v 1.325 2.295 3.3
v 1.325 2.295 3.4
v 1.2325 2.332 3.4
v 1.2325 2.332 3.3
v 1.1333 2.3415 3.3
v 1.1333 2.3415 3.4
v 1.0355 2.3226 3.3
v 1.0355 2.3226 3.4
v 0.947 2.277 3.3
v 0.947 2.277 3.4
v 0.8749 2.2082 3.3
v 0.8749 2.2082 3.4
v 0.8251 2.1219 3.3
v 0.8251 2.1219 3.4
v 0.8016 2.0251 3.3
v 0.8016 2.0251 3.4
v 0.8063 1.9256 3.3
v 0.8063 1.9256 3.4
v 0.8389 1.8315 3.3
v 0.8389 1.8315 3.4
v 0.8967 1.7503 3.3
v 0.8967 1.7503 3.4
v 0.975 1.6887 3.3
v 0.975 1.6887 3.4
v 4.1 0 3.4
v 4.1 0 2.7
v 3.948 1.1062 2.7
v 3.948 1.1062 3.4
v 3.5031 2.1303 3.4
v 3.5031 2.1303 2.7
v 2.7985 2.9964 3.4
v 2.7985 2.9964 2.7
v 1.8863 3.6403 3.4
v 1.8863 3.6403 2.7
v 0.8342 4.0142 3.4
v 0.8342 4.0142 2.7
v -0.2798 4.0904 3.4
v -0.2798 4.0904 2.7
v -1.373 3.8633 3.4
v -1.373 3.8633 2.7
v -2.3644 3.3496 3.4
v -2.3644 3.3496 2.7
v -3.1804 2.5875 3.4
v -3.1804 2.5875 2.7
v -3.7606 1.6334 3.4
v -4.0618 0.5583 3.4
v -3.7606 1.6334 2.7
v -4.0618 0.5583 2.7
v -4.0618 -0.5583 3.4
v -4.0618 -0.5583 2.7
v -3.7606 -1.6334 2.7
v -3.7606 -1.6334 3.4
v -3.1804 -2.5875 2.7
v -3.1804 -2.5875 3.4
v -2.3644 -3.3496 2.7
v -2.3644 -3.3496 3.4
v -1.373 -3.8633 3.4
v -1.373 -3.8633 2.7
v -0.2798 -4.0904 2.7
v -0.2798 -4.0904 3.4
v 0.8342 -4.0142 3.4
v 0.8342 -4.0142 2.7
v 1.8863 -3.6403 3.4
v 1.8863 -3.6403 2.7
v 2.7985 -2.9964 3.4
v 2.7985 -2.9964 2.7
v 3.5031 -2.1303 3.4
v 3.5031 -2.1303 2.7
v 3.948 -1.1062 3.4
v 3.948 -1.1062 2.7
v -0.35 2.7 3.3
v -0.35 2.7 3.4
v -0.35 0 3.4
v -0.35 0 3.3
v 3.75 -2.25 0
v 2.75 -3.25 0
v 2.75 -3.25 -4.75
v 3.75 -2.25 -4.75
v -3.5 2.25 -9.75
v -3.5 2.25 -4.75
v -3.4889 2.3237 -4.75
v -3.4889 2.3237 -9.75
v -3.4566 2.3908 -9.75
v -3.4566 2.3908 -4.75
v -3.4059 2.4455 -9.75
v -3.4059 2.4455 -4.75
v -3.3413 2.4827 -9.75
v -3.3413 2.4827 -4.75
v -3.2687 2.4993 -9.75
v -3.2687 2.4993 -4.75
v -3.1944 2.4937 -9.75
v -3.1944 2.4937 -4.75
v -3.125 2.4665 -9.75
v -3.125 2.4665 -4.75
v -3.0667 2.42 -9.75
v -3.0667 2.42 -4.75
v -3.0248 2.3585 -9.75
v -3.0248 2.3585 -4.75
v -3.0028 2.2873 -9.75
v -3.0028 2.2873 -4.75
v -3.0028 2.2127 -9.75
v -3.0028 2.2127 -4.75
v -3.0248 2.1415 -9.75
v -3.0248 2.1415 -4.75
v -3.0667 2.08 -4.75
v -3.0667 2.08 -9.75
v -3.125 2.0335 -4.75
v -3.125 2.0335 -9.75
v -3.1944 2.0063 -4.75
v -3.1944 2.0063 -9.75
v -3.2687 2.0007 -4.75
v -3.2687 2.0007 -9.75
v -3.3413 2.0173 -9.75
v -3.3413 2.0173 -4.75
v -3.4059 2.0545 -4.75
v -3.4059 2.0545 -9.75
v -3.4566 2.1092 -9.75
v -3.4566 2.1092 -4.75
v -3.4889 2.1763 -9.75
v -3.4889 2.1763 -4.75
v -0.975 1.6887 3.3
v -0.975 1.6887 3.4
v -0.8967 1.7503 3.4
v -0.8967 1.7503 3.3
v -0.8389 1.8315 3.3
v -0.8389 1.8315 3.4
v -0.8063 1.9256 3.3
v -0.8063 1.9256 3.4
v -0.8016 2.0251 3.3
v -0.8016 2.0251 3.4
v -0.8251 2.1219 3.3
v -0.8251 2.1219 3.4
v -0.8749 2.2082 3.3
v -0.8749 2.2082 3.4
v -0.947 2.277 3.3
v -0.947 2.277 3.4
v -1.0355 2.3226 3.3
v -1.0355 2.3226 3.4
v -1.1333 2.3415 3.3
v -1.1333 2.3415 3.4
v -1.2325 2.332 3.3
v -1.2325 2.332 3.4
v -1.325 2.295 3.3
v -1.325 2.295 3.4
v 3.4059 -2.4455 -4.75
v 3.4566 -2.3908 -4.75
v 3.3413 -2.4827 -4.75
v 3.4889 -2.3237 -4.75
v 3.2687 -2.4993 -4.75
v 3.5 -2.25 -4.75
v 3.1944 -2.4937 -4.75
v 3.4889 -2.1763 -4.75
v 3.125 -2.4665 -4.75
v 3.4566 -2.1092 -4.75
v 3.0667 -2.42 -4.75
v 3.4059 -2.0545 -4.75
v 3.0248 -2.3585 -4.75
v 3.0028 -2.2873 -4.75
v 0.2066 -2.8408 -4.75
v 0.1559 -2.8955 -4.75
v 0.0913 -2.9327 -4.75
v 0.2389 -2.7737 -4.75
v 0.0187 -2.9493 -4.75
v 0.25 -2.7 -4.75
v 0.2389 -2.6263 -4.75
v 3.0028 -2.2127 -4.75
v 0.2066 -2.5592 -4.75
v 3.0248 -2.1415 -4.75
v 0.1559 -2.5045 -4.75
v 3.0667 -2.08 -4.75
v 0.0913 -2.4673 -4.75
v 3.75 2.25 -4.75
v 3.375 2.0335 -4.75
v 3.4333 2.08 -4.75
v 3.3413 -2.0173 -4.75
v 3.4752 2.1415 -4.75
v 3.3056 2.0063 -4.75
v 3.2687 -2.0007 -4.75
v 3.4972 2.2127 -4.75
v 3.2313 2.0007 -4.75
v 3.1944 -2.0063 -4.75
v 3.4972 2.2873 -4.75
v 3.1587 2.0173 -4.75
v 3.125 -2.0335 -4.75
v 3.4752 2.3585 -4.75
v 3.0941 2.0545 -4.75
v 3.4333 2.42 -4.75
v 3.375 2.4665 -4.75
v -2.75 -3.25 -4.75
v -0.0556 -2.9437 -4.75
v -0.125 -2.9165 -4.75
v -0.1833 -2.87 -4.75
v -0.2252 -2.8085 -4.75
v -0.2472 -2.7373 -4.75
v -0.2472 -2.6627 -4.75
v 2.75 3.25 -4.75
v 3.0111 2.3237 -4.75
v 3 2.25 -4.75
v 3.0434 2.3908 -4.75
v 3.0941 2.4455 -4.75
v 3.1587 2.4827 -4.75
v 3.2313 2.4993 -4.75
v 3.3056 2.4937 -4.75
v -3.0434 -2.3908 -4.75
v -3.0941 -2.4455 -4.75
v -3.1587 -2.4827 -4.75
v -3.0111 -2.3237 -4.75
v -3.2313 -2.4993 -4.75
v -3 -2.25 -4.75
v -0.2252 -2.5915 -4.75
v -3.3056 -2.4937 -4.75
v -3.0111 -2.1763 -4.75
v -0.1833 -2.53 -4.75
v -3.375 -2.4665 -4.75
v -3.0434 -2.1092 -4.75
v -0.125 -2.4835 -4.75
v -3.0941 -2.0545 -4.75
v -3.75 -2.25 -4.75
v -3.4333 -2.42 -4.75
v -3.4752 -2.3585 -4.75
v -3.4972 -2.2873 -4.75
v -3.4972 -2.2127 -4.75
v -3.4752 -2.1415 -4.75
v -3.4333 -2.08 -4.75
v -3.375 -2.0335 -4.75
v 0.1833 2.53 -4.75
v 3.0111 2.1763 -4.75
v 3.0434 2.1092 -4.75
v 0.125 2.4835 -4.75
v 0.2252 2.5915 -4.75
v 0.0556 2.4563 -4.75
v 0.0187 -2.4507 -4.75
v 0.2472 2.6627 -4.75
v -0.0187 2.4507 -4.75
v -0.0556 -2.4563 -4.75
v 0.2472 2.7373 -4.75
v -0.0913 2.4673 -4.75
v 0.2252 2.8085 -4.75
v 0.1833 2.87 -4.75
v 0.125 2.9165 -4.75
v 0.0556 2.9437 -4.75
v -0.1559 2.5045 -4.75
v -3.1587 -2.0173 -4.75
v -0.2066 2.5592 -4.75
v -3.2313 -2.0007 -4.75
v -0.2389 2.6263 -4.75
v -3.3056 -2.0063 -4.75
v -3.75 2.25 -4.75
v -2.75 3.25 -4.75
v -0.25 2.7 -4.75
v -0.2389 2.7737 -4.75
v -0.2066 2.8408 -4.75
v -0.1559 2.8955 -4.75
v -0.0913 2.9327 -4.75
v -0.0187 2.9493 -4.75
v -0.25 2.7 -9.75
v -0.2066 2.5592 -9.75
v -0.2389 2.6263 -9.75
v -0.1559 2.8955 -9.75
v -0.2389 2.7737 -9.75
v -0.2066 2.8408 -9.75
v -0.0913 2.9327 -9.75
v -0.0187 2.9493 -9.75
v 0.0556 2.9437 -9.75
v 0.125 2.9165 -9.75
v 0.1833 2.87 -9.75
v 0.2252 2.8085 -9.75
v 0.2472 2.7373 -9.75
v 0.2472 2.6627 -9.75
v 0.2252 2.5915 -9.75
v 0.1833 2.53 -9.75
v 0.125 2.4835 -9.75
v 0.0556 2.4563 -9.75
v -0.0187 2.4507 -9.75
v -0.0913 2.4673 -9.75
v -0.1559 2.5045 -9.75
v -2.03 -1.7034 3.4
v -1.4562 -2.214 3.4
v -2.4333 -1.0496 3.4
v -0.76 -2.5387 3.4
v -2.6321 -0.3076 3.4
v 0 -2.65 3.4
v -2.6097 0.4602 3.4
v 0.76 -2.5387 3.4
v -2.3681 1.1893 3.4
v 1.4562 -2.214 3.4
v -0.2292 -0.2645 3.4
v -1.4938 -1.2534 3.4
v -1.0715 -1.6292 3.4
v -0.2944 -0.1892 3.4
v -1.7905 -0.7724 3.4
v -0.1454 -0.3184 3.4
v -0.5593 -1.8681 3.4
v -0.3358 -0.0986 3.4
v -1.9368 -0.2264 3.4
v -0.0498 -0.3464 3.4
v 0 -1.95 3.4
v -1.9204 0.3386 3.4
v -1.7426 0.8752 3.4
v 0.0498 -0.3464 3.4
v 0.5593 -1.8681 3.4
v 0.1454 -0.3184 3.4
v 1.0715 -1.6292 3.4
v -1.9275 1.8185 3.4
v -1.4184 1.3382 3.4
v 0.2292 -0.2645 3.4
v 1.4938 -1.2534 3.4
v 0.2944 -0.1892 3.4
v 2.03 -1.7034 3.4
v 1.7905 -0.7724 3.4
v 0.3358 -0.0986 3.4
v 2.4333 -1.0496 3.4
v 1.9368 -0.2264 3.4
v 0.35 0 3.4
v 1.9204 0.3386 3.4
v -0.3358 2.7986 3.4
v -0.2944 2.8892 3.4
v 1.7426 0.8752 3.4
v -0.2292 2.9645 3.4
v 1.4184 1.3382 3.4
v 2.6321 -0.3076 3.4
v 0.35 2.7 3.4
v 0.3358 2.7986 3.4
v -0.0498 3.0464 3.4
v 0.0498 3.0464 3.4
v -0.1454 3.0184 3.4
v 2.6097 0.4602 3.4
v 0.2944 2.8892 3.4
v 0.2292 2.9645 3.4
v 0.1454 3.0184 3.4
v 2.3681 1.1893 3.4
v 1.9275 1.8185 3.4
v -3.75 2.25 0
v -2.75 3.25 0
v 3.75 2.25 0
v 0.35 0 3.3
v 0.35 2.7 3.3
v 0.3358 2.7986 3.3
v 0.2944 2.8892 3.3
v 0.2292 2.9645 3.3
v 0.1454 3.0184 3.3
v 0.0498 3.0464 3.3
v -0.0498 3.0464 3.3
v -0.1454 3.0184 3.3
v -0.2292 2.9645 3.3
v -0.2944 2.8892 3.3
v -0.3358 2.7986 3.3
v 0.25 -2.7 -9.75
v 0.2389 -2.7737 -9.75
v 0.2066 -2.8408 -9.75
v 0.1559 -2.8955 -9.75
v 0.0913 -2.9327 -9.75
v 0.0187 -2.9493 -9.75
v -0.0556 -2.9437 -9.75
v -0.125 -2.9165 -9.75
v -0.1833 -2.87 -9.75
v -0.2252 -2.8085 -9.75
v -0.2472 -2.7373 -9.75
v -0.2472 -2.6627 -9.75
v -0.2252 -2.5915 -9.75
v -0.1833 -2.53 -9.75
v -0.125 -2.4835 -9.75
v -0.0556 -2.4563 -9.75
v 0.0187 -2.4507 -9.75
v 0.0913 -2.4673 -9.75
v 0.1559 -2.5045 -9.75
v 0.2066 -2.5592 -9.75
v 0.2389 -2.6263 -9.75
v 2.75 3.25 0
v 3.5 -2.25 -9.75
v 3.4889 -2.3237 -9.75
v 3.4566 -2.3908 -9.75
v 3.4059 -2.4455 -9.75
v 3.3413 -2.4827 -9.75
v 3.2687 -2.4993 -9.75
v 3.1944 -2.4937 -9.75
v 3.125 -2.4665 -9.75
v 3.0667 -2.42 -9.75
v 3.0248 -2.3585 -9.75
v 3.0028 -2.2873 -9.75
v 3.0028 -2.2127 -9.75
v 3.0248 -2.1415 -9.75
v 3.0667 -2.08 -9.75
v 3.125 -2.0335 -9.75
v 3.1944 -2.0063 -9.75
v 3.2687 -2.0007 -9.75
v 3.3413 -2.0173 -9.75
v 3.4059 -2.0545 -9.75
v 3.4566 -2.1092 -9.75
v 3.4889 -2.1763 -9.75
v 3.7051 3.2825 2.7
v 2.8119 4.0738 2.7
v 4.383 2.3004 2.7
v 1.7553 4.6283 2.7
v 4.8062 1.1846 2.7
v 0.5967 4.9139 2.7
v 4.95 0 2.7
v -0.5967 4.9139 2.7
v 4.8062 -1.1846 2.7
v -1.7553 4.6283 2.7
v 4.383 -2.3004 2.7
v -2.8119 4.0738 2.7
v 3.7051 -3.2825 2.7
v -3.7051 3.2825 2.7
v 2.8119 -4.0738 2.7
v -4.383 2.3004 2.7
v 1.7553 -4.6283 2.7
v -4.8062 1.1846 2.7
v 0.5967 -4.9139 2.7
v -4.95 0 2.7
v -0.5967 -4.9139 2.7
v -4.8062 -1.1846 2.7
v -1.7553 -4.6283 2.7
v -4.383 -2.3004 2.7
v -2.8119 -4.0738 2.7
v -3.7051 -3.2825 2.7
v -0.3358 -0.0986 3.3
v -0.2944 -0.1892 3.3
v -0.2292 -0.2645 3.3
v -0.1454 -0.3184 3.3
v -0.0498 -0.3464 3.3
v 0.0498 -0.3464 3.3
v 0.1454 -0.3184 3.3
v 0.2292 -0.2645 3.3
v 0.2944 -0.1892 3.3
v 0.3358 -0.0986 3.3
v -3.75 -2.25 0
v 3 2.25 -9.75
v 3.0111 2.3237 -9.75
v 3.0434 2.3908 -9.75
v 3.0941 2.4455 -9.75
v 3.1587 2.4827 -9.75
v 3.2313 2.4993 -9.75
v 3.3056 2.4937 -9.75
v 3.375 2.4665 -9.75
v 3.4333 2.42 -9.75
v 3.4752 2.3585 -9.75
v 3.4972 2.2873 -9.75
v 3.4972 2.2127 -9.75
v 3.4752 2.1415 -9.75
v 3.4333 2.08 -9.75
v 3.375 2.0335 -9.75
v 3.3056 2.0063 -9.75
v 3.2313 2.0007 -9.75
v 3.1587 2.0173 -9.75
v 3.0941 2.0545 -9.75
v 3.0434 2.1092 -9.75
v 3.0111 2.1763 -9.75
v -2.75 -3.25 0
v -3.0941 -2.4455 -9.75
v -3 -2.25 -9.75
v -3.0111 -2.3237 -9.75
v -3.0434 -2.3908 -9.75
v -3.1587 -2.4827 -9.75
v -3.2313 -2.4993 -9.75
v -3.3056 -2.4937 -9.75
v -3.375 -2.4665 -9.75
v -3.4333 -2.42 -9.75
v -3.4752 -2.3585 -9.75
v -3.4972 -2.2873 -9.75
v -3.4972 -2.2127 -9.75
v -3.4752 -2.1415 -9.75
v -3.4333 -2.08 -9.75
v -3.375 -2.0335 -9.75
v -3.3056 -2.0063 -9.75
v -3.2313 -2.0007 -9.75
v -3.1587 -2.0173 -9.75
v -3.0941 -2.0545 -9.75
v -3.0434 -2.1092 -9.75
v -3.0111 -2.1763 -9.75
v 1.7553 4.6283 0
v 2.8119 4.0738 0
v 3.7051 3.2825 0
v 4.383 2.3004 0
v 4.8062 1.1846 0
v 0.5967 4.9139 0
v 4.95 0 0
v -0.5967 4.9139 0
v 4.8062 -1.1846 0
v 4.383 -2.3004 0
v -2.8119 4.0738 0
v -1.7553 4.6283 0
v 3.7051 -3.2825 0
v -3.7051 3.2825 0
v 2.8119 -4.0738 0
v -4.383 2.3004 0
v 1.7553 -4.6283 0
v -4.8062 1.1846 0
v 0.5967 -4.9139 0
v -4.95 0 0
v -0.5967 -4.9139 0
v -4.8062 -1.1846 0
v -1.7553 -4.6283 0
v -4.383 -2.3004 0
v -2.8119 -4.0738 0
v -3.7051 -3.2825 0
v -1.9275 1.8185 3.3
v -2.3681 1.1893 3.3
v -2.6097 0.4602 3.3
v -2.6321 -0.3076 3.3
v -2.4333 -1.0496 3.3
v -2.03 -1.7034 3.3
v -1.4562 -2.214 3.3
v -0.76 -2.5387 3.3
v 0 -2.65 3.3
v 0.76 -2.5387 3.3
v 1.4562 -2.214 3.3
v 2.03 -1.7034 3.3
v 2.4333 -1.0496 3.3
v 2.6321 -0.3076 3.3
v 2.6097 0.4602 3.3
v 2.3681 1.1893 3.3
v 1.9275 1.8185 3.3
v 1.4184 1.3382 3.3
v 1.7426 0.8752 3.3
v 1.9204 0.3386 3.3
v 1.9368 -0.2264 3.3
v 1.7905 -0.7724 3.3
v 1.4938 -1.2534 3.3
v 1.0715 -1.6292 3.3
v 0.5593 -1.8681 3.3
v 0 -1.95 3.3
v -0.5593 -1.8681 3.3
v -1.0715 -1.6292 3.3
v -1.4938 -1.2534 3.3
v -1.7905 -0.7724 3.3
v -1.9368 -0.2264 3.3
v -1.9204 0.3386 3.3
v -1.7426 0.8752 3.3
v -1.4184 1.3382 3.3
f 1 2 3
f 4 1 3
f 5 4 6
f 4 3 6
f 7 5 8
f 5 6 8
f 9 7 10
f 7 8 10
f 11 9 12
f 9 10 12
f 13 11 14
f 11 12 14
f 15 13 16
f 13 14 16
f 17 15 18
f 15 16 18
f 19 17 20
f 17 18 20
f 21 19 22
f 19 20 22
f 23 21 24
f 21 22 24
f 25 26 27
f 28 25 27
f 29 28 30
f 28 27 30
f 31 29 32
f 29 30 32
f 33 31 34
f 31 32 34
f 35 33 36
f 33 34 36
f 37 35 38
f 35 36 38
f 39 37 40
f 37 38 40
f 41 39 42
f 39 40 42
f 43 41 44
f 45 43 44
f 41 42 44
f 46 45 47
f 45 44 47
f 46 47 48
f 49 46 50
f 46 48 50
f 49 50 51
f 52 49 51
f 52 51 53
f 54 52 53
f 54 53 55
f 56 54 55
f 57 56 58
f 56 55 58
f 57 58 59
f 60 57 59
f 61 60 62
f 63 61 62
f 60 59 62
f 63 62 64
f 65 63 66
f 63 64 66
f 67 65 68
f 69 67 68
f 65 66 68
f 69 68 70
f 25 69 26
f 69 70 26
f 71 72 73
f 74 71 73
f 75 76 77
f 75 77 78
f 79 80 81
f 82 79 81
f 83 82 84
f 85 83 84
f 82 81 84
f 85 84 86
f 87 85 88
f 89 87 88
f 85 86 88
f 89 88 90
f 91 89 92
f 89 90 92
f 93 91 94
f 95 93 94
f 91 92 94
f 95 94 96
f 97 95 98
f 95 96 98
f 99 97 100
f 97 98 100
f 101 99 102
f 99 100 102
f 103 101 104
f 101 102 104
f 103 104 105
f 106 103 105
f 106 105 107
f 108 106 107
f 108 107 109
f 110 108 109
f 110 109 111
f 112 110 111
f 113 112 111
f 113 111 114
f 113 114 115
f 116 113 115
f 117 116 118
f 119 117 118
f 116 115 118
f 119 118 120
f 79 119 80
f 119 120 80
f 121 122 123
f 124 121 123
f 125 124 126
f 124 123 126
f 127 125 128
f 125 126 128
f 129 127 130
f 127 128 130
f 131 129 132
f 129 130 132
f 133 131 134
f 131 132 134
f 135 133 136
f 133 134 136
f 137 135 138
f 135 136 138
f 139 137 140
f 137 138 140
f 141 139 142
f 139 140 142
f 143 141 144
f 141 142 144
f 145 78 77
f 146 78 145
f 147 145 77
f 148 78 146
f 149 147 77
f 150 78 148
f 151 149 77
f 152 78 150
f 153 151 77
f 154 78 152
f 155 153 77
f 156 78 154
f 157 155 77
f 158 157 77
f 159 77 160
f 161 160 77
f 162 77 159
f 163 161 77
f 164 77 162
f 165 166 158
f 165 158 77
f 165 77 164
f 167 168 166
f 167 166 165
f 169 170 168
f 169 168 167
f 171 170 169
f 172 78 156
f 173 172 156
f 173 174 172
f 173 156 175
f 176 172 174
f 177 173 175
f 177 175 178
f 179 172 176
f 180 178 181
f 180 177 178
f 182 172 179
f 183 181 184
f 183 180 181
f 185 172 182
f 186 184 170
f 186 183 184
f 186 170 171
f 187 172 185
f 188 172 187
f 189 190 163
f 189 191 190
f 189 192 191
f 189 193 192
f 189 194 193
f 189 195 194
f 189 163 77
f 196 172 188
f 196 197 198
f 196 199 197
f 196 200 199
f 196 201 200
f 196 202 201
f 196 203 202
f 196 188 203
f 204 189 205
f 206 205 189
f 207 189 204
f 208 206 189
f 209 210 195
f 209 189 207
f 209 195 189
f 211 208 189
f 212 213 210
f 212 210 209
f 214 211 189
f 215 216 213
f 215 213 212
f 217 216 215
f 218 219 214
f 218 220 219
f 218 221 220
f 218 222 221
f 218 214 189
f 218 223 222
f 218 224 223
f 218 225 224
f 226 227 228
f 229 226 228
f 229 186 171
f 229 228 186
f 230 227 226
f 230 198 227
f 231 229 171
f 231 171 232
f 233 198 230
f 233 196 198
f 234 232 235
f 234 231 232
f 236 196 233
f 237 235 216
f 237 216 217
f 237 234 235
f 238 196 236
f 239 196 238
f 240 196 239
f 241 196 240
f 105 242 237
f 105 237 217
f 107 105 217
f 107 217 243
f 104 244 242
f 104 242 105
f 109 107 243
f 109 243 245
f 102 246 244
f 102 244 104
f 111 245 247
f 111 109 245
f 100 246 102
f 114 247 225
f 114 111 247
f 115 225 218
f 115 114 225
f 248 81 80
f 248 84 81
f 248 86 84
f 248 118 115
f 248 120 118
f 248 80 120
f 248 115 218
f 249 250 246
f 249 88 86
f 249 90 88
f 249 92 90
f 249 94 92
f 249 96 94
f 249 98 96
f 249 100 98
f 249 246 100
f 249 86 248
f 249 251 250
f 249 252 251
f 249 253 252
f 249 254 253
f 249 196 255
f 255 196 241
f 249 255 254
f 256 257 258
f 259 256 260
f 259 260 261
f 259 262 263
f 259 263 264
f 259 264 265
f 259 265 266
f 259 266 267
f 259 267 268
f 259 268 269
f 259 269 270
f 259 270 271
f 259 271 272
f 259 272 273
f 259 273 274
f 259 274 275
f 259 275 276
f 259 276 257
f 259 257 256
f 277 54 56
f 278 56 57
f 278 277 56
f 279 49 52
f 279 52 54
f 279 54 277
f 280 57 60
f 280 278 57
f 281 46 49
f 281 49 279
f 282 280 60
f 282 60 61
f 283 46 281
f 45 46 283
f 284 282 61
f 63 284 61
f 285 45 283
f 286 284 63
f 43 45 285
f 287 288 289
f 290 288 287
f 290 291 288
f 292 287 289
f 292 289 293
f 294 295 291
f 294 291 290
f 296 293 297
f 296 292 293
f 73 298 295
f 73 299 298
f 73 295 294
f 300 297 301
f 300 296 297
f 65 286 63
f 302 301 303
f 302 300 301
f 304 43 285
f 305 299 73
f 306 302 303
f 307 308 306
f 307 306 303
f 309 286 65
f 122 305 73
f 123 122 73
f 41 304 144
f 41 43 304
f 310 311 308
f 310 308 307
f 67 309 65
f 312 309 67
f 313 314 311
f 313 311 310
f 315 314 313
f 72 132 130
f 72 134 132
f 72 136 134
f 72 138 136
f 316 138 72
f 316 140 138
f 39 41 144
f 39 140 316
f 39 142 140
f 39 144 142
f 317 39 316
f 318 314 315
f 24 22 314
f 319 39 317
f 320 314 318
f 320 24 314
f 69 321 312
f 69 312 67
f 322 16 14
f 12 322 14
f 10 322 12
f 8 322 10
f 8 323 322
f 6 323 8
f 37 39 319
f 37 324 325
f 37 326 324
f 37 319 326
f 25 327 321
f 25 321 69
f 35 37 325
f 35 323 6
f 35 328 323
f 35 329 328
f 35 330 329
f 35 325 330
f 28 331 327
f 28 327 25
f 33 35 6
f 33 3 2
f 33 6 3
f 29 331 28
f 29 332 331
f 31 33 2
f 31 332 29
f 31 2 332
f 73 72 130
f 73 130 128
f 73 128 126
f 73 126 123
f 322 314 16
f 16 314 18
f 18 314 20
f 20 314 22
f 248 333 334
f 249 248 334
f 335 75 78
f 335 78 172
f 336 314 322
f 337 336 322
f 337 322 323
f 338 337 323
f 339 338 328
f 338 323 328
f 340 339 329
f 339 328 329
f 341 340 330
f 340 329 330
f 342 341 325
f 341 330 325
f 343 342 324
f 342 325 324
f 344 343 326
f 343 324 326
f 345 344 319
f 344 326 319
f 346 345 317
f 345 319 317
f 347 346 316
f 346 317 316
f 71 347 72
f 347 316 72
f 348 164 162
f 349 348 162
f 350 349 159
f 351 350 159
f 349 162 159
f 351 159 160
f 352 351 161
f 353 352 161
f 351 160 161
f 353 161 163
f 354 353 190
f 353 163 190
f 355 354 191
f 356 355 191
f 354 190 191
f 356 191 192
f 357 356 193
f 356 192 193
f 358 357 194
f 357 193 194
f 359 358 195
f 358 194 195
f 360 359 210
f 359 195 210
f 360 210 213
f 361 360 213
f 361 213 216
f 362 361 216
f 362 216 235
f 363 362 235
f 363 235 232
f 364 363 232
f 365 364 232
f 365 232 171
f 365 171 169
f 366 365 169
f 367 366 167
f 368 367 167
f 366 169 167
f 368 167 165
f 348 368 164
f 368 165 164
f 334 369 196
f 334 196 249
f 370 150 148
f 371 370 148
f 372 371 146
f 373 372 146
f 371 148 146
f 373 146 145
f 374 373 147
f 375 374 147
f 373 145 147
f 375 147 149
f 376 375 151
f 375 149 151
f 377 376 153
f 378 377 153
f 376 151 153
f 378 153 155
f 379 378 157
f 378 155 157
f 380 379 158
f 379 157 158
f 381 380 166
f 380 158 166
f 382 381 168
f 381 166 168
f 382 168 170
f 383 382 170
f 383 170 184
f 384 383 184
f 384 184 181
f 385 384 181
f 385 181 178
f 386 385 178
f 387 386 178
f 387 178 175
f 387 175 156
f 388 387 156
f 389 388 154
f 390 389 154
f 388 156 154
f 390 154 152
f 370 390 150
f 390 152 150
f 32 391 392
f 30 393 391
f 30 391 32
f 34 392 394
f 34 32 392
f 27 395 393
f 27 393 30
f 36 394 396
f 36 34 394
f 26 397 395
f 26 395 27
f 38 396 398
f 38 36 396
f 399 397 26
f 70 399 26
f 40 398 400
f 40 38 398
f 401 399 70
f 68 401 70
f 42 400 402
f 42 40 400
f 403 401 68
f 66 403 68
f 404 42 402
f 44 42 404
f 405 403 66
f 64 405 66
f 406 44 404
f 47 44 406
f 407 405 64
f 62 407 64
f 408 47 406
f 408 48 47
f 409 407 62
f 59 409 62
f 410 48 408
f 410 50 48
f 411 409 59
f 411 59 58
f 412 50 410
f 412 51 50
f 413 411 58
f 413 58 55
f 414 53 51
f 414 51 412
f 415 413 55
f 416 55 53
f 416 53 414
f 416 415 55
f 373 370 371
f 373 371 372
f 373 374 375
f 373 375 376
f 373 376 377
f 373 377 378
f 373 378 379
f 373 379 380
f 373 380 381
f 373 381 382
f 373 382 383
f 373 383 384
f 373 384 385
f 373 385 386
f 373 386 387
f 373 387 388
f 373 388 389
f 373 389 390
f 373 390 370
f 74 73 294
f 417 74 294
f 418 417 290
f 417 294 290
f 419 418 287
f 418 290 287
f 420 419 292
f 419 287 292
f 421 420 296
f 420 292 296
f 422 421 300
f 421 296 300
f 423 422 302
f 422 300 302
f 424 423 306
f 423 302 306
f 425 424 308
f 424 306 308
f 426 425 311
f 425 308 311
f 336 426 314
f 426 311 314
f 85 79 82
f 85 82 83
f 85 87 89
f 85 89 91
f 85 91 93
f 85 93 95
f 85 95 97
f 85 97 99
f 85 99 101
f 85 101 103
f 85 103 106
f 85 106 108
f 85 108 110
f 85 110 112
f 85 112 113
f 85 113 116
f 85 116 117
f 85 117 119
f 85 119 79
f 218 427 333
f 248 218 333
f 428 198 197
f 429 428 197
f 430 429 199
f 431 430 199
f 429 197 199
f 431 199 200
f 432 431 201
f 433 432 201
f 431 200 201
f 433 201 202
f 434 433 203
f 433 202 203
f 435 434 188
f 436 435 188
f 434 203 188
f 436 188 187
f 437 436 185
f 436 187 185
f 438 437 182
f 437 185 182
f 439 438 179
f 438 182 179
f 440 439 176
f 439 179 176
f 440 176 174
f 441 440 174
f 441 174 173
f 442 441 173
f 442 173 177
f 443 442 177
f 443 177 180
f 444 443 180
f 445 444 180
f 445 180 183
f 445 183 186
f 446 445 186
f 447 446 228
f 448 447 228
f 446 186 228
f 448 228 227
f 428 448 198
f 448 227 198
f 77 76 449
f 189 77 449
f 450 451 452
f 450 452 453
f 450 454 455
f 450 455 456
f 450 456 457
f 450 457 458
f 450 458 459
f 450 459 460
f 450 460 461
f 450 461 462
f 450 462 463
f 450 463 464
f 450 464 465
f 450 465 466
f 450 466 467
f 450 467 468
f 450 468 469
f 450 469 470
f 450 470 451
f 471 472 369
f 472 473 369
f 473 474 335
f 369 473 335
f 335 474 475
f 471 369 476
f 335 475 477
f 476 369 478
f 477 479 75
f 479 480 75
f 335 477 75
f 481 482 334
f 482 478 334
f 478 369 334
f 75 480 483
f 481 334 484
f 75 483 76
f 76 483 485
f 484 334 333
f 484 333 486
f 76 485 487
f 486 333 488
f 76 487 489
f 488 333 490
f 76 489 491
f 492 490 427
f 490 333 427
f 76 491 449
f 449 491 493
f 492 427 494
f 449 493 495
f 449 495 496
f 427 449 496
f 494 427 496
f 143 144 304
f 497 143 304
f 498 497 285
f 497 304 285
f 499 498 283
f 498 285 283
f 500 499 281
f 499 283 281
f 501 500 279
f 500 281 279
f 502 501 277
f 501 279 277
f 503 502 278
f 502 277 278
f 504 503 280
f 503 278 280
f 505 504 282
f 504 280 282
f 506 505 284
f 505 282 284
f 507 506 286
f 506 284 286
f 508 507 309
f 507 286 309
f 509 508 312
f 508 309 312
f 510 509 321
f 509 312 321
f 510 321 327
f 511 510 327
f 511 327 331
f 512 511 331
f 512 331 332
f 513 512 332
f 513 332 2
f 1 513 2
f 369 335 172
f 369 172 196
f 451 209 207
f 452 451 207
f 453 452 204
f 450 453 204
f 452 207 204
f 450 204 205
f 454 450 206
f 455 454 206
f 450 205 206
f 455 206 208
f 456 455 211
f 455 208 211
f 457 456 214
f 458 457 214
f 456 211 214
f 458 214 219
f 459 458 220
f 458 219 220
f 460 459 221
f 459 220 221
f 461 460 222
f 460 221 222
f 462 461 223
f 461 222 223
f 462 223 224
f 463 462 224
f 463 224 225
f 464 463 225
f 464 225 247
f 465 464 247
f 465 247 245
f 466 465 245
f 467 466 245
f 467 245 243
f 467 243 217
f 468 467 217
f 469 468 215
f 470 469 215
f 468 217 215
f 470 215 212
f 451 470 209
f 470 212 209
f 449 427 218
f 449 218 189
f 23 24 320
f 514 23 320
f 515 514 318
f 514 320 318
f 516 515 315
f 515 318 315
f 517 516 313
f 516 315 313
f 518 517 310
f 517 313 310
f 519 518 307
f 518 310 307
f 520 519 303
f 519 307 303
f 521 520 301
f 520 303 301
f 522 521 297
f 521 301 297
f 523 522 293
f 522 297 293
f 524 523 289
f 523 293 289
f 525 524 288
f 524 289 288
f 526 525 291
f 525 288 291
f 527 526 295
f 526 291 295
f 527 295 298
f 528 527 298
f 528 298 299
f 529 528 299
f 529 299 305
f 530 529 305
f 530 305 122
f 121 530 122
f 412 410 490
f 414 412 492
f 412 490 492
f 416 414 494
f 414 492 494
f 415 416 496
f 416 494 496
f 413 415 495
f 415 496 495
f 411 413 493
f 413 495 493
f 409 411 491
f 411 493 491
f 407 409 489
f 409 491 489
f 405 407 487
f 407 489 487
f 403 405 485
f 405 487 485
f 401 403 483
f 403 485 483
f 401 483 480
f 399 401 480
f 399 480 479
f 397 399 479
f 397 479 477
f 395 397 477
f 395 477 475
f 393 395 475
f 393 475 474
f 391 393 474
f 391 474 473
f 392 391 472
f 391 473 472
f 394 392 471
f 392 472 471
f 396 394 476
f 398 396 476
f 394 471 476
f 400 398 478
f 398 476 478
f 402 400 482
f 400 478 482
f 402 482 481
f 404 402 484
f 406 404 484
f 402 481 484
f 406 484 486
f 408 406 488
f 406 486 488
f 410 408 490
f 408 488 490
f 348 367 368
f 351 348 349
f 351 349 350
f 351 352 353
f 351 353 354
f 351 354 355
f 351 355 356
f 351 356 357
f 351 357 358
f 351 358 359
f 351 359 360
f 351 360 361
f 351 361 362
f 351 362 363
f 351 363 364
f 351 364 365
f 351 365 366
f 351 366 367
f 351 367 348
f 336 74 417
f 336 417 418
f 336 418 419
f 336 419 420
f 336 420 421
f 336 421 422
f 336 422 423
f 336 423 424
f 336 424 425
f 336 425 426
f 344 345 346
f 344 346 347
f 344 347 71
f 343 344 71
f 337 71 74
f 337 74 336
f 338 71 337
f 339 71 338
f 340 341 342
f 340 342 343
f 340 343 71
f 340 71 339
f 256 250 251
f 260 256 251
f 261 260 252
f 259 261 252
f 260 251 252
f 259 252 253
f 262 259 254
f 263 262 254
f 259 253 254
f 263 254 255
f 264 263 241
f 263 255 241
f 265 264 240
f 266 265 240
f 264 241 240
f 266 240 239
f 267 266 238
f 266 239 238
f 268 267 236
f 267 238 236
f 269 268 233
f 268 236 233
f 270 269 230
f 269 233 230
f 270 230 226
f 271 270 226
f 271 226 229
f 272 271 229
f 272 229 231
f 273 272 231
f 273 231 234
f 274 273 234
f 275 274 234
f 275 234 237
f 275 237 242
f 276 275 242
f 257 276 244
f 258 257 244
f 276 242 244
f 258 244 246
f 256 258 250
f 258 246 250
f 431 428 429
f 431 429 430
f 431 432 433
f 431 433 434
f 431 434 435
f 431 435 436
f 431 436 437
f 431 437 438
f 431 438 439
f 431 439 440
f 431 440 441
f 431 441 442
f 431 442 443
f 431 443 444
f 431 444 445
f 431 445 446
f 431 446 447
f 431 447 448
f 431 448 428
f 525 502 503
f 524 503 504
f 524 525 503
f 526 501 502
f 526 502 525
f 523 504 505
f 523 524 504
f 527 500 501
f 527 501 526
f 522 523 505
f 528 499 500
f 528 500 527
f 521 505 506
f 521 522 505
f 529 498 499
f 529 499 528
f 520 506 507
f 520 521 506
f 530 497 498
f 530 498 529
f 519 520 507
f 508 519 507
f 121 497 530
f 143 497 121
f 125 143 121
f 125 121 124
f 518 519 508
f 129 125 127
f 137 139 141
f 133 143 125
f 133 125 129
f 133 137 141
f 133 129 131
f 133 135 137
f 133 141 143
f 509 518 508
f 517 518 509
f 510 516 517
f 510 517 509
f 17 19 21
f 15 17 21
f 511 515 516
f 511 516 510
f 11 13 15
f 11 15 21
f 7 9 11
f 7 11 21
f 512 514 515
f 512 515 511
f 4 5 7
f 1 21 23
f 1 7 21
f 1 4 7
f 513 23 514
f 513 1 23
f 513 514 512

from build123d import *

# Parameters (mm, degrees)
ESQUISSE1_R             = 4.95
BOSS_EXTRU_1_DEPTH      = 2.7
ESQUISSE2_W             = 7.5
ESQUISSE2_H             = 6.5
BOSS_EXTRU_2_DEPTH      = 4.75
ESQUISSE3_R             = 4.1
BOSS_EXTRU_3_DEPTH      = 0.7
CHANFREIN1_SIZE         = 1
ESQUISSE4_R             = 0.25
BOSS_EXTRU_4_DEPTH      = 5
ENL_V_MAT_EXTRU_1_DEPTH = 0.1


with BuildPart() as part:
    # Esquisse1 → Boss.-Extru.1 (new body)
    with BuildSketch(Plane.XY):
        with Locations(Location((0, 0, 0), (0, 0, 180))):
            Circle(ESQUISSE1_R)
    extrude(amount=BOSS_EXTRU_1_DEPTH)

    # Esquisse2 → Boss.-Extru.2 (add)
    with BuildSketch(Plane(origin=(0, 0, 0), x_dir=(-1, 0, 0), z_dir=(0, 0, -1))):
        Rectangle(ESQUISSE2_W, ESQUISSE2_H)
    extrude(amount=BOSS_EXTRU_2_DEPTH)

    # Esquisse3 → Boss.-Extru.3 (add)
    with BuildSketch(Plane.XY.offset(2.7)):
        Circle(ESQUISSE3_R)
    extrude(amount=BOSS_EXTRU_3_DEPTH)

    # Chanfrein1
    # the kernel refuses this chamfer: 1 mm, written as the material it takes off along each edge
    with BuildSketch(Plane(origin=(-3.75, -3.25, 0), x_dir=(-0.027495876610586487, 0.9996219169112968, 0), z_dir=(0, 0, -1)), Plane(origin=(3.75, 3.25, 0), x_dir=(0.027495876610586487, -0.9996219169112968, 0), z_dir=(0, 0, -1)), Plane(origin=(3.75, -3.25, 0), x_dir=(-0.9996219169112968, -0.027495876610586473, 0), z_dir=(0, 0, -1))) as chanfrein1_piece_1:
        Polygon((CHANFREIN1_SIZE * 0.999621916911, CHANFREIN1_SIZE * 0.0274958766106), (-CHANFREIN1_SIZE * 0.0274958766106, CHANFREIN1_SIZE * 0.999621916911), (0, 0), align=None)
    extrude(amount=7.321682988, mode=Mode.SUBTRACT)
    with BuildSketch(Plane(origin=(-3.75, 3.25, 0), x_dir=(-0.027495876610586487, -0.9996219169112968, 0), z_dir=(0, 0, -1))) as chanfrein1_piece_2:
        Polygon((CHANFREIN1_SIZE * 0.999621916911, -CHANFREIN1_SIZE * 0.0274958766106), (-CHANFREIN1_SIZE * 0.0274958766106, -CHANFREIN1_SIZE * 0.999621916911), (0, 0), align=None)
    extrude(amount=7.321682988, mode=Mode.SUBTRACT)

    # Esquisse4 → Boss.-Extru.4 (add)
    with BuildSketch(Plane(origin=(0, 0, -4.75), x_dir=(-1, 0, 0), z_dir=(0, 0, -1))):
        with Locations((-3.25, 2.25)):
            Circle(ESQUISSE4_R)
        with Locations((0, 2.7)):
            Circle(ESQUISSE4_R)
        with Locations((3.25, 2.25)):
            Circle(ESQUISSE4_R)
        with Locations(Location((3.25, -2.25, 0), (0, 0, 180))):
            Circle(ESQUISSE4_R)
        with Locations(Location((0, -2.7, 0), (0, 0, 180))):
            Circle(ESQUISSE4_R)
        with Locations(Location((-3.25, -2.25, 0), (0, 0, 180))):
            Circle(ESQUISSE4_R)
    extrude(amount=BOSS_EXTRU_4_DEPTH)

    # Esquisse5 → Enlèv. mat.-Extru.1 (cut)
    with BuildSketch(Plane.XY.offset(3.4)):
        with BuildLine():
            Line((-0.35, 2.7), (-0.35, 0))
            ThreePointArc((-0.35, 0), (0, -0.35), (0.35, 0))
            Line((0.35, 0), (0.35, 2.7))
            ThreePointArc((0.35, 2.7), (0, 3.05), (-0.35, 2.7))
        make_face()
        with BuildLine():
            ThreePointArc((-1.325, 2.29496732), (0, -2.65), (1.325, 2.29496732))
            ThreePointArc((1.325, 2.29496732), (0.846891109, 2.166858429), (0.975, 1.688749537))
            ThreePointArc((0.975, 1.688749537), (0, -1.95), (-0.975, 1.688749537))
            ThreePointArc((-0.975, 1.688749537), (-0.846891109, 2.166858429), (-1.325, 2.29496732))
        make_face()
    extrude(amount=-ENL_V_MAT_EXTRU_1_DEPTH, mode=Mode.SUBTRACT)


solid = part.part
